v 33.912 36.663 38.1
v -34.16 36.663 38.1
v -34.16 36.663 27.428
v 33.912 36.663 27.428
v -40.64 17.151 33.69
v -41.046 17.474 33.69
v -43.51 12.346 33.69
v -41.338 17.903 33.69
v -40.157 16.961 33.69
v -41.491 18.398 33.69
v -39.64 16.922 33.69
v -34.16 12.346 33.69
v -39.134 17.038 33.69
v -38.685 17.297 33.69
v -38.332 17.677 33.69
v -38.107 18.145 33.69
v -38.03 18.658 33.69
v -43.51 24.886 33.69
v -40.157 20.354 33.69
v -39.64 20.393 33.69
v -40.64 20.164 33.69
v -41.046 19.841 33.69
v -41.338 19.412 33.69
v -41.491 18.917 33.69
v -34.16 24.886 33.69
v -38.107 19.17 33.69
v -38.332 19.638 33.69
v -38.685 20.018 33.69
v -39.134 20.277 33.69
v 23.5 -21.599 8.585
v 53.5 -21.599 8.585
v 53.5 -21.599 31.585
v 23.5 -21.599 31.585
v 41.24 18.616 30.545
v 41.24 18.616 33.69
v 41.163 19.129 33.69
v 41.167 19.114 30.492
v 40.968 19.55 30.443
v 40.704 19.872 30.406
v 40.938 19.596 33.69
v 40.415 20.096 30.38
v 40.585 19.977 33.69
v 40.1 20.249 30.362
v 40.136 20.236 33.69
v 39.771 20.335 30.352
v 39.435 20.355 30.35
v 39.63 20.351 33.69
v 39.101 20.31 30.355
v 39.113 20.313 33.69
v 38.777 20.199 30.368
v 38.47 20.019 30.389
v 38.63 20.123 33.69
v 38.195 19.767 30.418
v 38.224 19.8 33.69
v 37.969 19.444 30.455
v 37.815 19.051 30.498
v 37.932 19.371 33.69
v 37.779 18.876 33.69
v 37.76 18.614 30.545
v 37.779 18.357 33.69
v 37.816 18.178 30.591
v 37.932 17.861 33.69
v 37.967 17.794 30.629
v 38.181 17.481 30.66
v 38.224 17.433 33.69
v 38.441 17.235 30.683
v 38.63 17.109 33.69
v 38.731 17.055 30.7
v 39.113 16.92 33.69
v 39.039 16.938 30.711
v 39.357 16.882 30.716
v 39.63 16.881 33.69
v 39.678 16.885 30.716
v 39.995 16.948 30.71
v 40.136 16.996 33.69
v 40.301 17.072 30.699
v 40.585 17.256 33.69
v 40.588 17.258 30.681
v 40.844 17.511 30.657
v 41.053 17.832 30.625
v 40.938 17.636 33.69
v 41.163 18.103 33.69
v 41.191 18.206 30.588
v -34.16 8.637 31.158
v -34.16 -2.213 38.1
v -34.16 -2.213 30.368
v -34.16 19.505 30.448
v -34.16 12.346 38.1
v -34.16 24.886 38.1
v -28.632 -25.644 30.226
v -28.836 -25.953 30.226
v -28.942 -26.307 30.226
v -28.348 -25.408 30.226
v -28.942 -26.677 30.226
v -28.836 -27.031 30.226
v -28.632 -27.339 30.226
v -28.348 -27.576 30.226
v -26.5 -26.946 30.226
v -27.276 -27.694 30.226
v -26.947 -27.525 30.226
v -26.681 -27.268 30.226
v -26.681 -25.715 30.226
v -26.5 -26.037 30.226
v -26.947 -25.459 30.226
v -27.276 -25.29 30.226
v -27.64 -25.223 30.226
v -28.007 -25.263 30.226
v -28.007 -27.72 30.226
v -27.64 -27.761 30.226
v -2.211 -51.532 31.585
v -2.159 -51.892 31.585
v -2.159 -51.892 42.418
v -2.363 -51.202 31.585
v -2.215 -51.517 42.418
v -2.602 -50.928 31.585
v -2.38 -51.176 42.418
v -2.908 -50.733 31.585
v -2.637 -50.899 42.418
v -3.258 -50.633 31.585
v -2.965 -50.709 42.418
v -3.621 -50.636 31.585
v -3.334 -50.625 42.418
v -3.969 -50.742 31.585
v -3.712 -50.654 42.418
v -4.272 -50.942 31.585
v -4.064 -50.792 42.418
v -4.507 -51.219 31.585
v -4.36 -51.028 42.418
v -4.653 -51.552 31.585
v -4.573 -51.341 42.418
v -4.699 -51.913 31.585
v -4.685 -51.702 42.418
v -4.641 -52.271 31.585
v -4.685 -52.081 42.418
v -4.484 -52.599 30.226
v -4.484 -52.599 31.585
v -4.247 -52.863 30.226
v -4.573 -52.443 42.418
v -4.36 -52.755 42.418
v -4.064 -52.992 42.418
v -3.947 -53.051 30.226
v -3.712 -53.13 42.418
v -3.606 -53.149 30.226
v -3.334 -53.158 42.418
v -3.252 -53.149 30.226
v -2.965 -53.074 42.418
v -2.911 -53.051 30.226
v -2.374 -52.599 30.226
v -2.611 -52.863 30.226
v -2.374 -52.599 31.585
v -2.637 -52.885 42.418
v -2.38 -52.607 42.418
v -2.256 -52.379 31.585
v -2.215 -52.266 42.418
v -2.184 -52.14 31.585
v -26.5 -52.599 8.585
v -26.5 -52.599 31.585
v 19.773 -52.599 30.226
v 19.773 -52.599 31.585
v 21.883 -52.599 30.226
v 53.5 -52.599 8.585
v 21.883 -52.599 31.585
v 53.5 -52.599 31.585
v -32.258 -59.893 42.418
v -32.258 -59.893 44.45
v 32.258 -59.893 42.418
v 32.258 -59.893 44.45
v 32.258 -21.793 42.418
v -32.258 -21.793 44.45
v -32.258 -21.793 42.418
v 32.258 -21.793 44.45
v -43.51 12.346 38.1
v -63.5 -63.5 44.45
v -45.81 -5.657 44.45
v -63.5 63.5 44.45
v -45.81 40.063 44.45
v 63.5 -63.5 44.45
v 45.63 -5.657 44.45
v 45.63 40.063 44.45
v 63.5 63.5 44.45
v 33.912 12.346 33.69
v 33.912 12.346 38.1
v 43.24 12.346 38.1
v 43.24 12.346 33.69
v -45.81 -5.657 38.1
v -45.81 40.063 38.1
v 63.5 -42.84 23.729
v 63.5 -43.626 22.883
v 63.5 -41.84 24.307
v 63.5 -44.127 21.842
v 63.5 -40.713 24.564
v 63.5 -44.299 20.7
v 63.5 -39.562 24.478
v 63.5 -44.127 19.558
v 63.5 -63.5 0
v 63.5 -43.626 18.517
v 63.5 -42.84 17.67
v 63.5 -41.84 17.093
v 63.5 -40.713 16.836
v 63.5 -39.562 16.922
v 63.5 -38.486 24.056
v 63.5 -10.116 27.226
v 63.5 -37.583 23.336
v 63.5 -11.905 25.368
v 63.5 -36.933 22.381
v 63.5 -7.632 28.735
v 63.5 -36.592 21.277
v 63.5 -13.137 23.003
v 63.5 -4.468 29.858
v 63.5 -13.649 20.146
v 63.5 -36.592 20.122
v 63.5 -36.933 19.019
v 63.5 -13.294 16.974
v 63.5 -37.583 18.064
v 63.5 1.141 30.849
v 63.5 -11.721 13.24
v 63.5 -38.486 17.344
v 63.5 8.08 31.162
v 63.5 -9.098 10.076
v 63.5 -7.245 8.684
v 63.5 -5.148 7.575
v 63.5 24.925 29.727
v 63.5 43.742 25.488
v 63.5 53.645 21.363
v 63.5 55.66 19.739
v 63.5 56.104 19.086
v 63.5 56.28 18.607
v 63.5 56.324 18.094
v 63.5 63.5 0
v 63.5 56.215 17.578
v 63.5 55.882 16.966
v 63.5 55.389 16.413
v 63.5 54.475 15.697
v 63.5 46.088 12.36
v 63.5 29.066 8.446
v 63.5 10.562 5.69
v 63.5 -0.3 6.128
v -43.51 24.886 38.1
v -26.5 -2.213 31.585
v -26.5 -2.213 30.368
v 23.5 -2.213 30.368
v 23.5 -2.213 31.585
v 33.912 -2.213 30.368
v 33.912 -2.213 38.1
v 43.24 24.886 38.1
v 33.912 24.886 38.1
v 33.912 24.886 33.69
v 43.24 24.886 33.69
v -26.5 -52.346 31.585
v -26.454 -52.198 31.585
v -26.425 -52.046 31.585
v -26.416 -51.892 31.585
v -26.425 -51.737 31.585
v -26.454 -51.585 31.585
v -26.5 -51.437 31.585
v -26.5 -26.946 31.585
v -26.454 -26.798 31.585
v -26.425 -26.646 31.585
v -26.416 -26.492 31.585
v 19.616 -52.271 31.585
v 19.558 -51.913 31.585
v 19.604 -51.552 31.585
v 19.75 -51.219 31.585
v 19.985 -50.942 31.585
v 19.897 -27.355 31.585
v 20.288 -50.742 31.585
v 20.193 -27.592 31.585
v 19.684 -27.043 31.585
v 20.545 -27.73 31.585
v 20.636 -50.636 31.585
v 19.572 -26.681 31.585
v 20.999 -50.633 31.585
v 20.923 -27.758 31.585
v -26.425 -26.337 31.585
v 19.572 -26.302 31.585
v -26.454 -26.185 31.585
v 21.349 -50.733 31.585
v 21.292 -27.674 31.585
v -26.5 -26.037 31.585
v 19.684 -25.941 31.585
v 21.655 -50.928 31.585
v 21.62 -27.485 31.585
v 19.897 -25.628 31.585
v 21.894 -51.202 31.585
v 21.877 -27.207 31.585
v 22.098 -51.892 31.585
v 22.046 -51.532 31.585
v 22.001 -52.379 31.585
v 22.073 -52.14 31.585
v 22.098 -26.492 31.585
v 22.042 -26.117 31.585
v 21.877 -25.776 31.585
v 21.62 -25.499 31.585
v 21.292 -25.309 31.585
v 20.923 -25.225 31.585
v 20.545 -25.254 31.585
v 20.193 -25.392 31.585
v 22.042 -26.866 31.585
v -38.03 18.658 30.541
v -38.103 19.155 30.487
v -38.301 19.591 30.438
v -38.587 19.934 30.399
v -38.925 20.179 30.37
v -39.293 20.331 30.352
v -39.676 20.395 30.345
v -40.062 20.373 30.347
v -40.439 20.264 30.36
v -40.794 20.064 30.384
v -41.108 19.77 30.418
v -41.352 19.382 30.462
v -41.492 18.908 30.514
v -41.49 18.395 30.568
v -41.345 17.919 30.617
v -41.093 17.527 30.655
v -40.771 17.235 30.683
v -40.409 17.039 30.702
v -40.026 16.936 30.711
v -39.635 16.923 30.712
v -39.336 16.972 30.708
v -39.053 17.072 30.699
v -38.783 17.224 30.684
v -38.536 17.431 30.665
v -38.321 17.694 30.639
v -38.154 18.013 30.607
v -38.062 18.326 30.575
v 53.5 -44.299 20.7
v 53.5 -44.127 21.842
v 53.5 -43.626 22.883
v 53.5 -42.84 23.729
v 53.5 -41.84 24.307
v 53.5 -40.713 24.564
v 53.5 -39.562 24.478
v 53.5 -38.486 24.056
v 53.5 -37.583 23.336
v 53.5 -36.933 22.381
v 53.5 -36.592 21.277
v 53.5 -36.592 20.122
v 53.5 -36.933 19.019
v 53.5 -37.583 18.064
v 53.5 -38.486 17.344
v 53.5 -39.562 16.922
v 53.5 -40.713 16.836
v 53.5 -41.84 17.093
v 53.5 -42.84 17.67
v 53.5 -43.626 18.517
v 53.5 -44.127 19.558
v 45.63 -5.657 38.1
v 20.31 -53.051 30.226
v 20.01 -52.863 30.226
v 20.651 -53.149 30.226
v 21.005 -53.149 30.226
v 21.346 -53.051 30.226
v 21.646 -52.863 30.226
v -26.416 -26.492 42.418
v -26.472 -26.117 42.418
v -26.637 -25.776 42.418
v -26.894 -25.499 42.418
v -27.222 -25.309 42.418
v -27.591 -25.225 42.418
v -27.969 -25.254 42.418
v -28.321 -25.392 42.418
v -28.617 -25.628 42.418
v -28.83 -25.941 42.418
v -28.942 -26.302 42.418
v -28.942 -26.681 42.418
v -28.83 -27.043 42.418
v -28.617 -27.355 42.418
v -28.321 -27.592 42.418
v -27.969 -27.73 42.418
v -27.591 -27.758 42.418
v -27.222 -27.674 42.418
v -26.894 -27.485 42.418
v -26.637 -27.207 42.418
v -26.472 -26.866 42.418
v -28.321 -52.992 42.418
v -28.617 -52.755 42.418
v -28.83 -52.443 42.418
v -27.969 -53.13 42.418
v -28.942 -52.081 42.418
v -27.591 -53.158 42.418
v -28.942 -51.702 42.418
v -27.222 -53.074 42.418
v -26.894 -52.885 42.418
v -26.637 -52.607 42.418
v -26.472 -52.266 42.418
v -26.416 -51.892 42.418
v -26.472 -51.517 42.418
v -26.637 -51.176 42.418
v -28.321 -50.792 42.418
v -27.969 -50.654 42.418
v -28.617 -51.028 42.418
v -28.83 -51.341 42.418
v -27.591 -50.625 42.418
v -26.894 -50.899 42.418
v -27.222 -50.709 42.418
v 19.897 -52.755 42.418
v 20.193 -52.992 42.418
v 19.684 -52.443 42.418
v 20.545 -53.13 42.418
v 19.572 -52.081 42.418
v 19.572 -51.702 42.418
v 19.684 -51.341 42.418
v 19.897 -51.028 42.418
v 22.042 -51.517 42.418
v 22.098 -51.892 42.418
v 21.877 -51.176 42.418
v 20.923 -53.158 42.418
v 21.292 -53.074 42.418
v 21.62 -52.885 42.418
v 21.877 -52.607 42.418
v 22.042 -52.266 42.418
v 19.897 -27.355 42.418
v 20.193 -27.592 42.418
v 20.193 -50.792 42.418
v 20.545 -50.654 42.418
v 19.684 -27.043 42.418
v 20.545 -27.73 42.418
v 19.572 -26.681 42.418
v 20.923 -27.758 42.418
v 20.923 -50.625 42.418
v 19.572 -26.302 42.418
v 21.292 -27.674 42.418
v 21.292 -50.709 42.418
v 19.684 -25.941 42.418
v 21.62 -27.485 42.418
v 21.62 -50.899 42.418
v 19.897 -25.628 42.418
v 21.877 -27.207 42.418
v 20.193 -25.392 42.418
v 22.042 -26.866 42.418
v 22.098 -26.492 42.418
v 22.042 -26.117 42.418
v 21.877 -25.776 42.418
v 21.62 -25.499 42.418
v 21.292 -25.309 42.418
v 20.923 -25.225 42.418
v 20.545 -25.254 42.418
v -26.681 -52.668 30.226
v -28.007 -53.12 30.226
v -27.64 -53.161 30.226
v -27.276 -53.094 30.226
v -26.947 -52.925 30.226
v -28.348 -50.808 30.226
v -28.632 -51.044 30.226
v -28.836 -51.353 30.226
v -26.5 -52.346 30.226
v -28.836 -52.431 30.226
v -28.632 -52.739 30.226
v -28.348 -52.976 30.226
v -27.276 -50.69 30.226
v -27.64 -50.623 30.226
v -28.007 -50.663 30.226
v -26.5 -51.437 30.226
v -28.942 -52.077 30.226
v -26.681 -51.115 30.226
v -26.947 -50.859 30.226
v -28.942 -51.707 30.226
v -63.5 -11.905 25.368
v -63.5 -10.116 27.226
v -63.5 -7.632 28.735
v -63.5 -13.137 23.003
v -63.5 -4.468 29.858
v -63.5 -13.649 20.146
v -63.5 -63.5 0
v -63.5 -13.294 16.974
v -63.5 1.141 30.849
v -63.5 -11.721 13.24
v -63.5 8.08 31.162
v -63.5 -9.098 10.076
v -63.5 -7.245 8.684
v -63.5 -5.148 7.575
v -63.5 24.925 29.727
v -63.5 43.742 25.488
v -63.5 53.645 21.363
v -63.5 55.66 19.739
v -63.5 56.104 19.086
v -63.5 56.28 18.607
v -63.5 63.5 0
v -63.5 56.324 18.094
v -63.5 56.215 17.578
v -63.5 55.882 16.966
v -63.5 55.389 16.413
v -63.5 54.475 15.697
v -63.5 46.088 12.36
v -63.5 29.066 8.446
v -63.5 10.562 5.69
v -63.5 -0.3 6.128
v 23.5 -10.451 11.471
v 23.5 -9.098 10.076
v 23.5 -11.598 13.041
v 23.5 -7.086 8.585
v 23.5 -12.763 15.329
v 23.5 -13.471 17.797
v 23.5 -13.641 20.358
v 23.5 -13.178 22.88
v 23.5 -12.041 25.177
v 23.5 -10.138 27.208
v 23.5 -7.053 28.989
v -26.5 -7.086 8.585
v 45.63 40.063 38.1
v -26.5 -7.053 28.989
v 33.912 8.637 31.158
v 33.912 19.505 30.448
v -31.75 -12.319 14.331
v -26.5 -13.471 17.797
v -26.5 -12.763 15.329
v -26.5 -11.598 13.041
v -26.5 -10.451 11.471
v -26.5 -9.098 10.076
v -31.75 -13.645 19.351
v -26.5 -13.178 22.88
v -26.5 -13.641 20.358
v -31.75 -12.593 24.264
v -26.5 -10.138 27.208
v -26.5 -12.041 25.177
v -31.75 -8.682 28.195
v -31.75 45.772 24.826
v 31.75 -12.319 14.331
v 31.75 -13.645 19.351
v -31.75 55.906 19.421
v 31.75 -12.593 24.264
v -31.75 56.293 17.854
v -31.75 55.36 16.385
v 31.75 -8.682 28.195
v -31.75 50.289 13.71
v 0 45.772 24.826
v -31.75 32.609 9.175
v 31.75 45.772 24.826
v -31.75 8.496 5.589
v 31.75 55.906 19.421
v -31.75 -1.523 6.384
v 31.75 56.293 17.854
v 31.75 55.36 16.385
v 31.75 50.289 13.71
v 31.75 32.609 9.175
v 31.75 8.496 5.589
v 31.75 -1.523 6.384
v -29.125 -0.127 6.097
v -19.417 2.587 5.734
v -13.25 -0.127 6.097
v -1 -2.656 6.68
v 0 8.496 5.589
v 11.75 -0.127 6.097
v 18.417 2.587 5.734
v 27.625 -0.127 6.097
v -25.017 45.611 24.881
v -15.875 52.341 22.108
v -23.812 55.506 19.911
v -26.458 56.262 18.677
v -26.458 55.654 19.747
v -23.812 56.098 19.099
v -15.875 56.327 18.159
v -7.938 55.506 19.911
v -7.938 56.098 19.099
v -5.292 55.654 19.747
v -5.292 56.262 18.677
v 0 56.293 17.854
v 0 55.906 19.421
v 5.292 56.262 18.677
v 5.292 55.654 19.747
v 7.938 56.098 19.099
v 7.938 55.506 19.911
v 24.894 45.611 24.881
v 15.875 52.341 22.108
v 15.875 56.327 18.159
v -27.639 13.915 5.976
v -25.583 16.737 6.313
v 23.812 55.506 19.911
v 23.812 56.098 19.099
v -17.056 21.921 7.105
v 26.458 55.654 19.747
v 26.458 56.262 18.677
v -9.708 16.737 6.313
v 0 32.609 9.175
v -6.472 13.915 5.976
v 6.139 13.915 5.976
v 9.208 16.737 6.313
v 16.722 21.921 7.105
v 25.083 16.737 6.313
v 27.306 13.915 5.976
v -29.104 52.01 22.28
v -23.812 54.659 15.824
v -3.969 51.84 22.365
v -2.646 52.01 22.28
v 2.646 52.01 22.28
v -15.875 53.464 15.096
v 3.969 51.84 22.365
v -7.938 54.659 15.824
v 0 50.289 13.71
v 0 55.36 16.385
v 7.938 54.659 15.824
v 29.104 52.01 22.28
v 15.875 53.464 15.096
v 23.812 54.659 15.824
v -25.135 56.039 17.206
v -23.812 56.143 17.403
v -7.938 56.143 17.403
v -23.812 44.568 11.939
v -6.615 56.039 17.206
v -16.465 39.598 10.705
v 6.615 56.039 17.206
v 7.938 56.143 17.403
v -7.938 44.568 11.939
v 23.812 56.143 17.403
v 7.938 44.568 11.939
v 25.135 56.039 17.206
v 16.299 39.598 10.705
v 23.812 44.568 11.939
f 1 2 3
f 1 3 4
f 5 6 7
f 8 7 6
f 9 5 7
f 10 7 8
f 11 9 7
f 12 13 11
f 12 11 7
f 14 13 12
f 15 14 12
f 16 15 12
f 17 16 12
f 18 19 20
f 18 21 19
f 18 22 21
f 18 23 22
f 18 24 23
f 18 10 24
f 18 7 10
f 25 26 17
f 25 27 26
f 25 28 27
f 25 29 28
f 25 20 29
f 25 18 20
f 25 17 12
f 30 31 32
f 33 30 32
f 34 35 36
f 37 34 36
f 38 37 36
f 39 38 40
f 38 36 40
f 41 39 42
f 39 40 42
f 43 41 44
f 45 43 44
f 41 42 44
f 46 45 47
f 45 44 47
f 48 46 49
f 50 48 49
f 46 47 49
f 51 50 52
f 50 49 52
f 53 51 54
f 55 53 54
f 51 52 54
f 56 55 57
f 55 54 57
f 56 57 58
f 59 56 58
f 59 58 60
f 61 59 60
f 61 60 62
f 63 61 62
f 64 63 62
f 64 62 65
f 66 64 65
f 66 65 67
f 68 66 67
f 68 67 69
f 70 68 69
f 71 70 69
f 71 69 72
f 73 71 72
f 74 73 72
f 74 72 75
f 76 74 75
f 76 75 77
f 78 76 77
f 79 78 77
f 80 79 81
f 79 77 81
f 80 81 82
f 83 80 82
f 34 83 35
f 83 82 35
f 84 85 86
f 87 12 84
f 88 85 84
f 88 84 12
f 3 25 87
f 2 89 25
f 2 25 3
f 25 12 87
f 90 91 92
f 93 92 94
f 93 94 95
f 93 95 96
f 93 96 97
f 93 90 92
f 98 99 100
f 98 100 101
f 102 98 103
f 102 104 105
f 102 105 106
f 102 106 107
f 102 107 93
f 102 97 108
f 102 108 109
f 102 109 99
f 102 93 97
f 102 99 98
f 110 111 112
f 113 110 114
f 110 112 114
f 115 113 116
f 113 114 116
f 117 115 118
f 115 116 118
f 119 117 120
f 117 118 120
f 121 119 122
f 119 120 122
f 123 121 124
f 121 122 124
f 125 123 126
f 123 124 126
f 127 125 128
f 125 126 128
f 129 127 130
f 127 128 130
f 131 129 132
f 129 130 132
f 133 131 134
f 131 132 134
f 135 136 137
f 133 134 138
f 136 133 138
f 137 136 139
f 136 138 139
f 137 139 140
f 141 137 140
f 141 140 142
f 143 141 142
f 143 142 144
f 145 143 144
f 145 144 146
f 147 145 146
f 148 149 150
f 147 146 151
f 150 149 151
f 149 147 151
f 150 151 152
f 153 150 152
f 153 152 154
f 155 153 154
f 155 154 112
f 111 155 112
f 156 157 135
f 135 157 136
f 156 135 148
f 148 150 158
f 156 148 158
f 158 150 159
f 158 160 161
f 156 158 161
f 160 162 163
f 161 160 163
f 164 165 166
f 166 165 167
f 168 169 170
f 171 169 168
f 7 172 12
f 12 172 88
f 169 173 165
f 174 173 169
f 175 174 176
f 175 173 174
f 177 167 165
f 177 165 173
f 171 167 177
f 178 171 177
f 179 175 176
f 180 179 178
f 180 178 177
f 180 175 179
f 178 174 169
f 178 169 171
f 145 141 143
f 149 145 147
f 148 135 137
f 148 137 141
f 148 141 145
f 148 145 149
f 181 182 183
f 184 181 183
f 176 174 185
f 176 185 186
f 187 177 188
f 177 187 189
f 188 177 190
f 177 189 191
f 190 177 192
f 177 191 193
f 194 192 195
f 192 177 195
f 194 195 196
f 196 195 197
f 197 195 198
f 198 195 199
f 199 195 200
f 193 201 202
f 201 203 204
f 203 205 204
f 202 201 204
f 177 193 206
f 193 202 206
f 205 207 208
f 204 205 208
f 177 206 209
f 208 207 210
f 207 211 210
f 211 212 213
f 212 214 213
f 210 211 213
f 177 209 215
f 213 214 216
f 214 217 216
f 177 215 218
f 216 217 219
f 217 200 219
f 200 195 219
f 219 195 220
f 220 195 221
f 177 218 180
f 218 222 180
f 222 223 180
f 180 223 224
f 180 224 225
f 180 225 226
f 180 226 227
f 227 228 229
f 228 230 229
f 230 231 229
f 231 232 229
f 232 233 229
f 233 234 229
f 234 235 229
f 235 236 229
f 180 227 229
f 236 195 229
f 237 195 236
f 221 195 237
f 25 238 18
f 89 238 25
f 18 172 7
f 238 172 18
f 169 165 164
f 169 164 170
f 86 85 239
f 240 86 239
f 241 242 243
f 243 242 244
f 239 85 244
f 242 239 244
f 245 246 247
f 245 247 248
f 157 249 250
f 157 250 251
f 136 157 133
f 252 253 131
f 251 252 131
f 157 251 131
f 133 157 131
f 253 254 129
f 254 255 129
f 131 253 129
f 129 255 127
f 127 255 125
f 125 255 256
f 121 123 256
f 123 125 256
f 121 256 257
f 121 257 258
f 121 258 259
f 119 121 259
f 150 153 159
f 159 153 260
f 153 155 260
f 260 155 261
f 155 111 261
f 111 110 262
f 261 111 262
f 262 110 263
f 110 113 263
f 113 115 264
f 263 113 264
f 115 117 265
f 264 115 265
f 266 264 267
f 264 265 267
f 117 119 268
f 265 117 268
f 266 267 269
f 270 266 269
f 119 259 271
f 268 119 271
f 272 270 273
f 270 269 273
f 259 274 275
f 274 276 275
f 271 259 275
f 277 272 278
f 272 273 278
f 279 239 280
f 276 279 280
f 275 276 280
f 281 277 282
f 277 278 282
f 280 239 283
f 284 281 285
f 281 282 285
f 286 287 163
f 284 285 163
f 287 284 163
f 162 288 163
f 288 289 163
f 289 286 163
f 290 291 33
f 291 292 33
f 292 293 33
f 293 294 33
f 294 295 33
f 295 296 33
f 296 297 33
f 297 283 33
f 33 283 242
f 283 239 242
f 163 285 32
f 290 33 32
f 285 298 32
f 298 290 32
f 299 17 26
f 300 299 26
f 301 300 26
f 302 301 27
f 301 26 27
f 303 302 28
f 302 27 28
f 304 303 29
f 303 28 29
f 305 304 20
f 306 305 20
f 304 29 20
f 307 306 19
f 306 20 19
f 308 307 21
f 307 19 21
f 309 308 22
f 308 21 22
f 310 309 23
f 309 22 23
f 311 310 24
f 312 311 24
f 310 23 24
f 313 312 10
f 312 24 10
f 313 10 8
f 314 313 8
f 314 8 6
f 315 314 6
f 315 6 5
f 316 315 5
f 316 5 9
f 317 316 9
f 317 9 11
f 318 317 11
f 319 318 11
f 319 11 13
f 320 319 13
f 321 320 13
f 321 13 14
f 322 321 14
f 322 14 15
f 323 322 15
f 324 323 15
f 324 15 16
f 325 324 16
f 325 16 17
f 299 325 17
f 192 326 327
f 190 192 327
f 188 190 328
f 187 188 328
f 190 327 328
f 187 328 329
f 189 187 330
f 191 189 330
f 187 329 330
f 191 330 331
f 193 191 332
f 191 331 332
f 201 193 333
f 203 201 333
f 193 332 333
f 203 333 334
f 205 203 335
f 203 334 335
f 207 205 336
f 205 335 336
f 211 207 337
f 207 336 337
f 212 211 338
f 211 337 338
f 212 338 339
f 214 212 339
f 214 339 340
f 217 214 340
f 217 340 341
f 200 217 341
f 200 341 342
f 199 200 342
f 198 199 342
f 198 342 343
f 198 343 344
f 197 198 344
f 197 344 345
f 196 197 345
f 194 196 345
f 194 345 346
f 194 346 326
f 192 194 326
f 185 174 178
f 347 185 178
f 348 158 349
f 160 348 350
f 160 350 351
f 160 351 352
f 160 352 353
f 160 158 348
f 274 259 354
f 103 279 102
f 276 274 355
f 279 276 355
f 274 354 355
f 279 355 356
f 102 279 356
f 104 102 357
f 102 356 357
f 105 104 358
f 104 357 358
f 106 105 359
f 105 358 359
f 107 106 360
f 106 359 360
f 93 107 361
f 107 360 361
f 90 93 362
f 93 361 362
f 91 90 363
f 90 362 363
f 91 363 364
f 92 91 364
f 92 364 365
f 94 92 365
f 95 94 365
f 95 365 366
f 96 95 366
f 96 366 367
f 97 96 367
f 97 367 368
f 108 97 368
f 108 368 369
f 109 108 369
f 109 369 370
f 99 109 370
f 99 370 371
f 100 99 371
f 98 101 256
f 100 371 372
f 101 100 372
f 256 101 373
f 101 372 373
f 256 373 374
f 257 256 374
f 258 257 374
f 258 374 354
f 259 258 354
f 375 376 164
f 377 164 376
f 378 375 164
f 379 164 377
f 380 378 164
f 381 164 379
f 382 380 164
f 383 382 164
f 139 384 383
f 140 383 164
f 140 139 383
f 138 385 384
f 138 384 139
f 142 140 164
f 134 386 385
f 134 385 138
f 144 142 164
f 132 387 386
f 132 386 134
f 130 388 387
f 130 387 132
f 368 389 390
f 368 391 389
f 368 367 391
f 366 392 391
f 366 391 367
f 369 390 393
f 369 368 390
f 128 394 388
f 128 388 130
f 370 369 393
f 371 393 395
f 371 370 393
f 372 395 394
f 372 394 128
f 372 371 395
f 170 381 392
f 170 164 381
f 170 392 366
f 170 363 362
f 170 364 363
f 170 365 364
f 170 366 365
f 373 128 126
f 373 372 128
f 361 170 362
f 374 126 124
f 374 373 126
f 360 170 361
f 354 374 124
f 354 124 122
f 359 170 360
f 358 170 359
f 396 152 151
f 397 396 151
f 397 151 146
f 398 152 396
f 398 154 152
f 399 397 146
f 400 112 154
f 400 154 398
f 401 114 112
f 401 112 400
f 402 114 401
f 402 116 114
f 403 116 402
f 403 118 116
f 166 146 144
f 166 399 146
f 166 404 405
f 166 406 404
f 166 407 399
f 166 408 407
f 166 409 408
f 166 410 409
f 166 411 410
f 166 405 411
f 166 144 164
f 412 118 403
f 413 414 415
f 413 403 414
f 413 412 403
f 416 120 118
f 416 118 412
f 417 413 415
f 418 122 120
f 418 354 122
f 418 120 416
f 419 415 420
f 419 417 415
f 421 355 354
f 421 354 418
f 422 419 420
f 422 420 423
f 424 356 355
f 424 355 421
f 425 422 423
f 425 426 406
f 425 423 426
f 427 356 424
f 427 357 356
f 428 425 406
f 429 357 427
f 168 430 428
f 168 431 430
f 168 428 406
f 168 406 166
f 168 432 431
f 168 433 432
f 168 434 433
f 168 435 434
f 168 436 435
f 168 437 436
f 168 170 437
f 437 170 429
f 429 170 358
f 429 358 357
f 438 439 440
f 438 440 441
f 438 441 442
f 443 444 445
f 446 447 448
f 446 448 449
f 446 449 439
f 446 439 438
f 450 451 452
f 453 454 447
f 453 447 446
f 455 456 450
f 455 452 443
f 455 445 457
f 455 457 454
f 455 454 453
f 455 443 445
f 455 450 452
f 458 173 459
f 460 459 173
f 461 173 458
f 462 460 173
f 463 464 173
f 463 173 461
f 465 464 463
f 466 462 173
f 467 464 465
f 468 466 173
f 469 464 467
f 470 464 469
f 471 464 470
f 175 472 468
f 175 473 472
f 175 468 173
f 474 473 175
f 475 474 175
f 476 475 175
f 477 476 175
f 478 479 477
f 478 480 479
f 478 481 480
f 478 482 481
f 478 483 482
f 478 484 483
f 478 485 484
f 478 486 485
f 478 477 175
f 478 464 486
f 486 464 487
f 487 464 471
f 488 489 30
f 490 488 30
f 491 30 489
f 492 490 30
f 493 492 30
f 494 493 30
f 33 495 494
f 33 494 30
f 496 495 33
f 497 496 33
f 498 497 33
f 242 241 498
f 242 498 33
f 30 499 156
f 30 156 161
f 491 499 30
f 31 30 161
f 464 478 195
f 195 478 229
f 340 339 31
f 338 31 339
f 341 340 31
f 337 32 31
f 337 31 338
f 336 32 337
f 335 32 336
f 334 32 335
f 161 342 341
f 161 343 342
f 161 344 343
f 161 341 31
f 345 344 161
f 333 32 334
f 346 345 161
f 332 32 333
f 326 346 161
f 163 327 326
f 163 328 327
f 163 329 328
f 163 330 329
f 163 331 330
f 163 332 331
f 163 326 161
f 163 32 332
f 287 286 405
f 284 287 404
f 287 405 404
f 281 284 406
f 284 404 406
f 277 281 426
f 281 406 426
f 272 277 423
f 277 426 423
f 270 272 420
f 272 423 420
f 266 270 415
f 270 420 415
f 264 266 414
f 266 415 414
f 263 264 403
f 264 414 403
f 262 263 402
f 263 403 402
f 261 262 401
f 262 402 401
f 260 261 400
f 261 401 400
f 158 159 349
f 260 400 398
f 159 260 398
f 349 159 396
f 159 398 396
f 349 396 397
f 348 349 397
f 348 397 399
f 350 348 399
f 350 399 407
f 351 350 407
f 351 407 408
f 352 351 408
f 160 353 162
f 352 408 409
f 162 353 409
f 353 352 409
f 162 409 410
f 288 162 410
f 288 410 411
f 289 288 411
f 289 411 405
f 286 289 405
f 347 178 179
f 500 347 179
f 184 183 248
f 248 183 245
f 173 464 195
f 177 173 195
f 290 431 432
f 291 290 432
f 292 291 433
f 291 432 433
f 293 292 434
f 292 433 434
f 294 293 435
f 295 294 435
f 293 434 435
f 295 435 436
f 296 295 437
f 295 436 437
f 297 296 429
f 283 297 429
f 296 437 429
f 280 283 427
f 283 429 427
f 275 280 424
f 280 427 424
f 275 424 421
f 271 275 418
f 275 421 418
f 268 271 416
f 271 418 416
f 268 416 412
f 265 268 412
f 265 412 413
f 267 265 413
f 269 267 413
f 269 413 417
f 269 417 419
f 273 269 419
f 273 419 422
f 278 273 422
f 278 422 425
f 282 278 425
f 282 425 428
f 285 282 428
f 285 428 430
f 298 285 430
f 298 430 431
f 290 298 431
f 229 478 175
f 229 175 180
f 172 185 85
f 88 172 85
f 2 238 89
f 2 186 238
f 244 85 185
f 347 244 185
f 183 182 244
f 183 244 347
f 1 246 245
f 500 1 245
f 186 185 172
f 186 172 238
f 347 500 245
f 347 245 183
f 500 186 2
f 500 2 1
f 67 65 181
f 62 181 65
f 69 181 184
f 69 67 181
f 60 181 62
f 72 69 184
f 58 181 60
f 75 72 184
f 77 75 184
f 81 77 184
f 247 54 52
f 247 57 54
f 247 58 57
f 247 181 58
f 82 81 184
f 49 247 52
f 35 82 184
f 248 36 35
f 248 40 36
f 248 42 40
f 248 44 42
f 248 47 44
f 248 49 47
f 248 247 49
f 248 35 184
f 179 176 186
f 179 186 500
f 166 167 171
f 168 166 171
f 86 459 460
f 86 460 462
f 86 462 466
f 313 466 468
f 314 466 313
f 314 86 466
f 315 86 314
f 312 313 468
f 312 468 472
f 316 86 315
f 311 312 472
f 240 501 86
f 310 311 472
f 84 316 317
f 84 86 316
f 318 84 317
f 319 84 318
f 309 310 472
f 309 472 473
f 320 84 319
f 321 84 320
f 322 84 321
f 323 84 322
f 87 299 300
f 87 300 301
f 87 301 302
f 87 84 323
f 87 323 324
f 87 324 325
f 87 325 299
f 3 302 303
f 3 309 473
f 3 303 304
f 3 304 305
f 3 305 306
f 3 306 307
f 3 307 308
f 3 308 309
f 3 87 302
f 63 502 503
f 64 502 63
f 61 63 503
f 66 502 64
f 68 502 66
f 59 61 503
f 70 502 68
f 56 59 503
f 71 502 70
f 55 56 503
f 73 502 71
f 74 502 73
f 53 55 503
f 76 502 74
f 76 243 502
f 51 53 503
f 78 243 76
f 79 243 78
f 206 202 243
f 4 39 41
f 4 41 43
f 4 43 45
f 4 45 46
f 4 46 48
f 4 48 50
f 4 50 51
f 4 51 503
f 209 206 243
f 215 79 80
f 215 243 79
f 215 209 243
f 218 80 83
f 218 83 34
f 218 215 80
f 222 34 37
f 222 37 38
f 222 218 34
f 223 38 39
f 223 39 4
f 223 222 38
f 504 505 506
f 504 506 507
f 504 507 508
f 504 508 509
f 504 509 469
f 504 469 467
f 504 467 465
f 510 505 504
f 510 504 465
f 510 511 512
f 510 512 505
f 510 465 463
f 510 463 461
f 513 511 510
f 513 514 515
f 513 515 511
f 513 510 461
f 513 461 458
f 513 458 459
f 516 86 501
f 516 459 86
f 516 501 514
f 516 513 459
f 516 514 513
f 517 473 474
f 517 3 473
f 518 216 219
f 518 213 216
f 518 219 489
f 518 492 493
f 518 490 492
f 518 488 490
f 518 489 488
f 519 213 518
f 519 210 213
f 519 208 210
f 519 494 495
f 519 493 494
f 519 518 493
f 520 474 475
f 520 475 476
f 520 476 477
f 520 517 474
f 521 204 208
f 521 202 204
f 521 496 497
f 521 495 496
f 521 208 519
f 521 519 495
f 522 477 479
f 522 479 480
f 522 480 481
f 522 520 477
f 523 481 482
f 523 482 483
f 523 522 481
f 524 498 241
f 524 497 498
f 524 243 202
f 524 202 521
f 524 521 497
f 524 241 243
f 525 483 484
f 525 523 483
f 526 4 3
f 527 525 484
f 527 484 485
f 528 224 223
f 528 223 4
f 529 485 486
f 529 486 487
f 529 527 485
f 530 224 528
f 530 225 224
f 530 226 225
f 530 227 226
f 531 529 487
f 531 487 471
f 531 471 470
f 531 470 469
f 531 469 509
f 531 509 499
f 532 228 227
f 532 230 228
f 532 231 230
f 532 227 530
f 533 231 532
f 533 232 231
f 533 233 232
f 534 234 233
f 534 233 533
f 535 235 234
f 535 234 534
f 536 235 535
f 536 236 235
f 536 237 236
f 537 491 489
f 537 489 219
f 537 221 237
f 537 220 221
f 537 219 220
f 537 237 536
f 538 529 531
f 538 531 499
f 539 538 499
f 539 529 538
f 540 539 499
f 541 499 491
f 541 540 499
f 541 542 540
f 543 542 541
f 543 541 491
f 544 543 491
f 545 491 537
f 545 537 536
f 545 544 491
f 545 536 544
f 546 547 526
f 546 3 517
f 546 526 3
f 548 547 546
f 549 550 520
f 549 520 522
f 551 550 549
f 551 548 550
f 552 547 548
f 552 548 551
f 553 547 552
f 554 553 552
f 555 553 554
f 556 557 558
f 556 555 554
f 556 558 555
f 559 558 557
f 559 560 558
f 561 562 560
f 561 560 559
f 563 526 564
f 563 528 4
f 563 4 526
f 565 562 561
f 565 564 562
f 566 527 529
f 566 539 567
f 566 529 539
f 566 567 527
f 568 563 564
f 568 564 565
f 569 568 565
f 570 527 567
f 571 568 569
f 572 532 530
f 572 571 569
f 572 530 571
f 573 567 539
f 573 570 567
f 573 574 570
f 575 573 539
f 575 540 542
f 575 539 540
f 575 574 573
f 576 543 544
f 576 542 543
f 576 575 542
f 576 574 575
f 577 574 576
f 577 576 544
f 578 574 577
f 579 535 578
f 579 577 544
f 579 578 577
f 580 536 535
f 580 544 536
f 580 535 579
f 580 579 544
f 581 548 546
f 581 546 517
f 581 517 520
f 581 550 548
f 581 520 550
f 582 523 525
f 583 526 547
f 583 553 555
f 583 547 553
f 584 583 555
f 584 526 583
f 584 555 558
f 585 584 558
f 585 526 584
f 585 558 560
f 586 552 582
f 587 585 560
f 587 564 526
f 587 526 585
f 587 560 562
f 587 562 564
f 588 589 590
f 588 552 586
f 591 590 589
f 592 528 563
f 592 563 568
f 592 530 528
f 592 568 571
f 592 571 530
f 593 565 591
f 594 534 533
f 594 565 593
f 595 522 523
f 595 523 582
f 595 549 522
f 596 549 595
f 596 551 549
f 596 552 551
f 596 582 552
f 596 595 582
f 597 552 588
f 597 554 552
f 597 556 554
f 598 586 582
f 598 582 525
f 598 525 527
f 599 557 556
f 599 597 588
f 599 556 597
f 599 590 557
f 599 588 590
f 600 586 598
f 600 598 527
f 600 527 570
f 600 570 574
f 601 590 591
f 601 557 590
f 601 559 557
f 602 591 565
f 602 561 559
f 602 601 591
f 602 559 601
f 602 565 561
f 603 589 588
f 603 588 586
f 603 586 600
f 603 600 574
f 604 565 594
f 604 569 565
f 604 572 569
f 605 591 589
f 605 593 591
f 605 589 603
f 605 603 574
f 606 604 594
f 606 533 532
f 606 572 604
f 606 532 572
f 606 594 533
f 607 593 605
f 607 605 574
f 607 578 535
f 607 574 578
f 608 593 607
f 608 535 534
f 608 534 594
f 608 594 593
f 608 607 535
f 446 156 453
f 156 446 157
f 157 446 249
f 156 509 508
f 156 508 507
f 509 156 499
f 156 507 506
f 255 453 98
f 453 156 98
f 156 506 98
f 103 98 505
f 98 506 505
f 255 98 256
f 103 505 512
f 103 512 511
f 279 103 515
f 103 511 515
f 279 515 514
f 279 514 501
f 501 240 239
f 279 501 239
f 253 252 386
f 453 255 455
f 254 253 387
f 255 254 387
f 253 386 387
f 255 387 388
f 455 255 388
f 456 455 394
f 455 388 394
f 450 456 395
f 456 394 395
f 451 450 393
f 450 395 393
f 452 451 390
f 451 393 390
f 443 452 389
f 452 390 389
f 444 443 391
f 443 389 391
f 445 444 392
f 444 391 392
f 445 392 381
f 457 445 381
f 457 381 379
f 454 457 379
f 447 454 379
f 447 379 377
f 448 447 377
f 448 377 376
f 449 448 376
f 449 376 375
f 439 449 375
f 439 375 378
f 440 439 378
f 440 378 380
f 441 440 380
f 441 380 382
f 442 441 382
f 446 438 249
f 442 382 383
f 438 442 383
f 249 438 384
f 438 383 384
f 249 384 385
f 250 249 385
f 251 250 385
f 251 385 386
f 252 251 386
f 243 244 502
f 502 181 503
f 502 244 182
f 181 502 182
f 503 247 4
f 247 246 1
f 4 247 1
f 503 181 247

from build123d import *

# Parameters (mm, degrees)
F0_W      = 127
F0_H      = 127
F1_DEPTH  = 44.45
F2_W      = 64.516
F2_H      = 38.1
F3_DEPTH  = 2.032
F4_R      = 1.27
F5_DEPTH  = 12.192
F6_R      = 1.27
F7_DEPTH  = 12.192
F9_DEPTH  = 127
F10_W     = 91.44
F10_H     = 45.72
F11_DEPTH = 6.35
F12_W     = 68.072
F12_H     = 38.876
F13_DEPTH = 13.87
F14_W     = 9.35
F14_H     = 12.54
F15_DEPTH = 4.41
F16_R     = 1.74
F17_DEPTH = 8.4
F18_W     = 50
F18_H     = 23
F19_DEPTH = 52.59892
F20_W     = 31
F20_H     = 23
F21_DEPTH = 30
F22_R     = 3.875
F23_DEPTH = 10.4


with BuildPart() as f1:
    # F0 (on Top) → F1 (new body)
    with BuildSketch(Plane.XY):
        Rectangle(F0_W, F0_H)
    extrude(amount=F1_DEPTH)

    # F2 (on face) → F3 (cut)
    with BuildSketch(Plane.XY.offset(44.45)):
        with Locations((0, -40.8426690847)):
            Rectangle(F2_W, F2_H)
    extrude(amount=-F3_DEPTH, mode=Mode.SUBTRACT)

    # F4 (on face) → F5 (cut)
    with BuildSketch(Plane.XY.offset(42.418)):
        with Locations((20.828, -26.4916690847)):
            Circle(F4_R)
        with Locations((20.828, -51.8916690847)):
            Circle(F4_R)
        with Locations((-3.429, -51.8916690847)):
            Circle(F4_R)
        with Locations((-3.429, -26.4916690847)):
            Circle(F4_R)
        with Locations((-27.686, -26.4916690847)):
            Circle(F4_R)
        with Locations((-27.686, -51.8916690847)):
            Circle(F4_R)
    extrude(amount=-F5_DEPTH, mode=Mode.SUBTRACT)

    # F6 (on face) → F7 (join, through all)
    with BuildSketch(Plane.XY.offset(30.226)):
        with Locations((-3.429, -26.4916690847)):
            Circle(F6_R)
    extrude(amount=F7_DEPTH)

    # F8 (on face) → F9 (cut, through all)
    with BuildSketch(Plane.YZ.offset(63.5)):
        with BuildLine():
            add(Edge.make_bspline(
                [(-9.0976032104, 10.0759316516), (-14.4431789893, 14.8498555161), (-18.9998192848, 41.3407976718), (79.8789980532, 20.1886498245), (28.9220234676, 7.8572214413), (-0.9875973505, 2.8332038113), (-9.0976032104, 10.0759316516)],
                knots=[0, 0, 0, 0, 0.1786168384, 0.5173503637, 0.7290126141, 1, 1, 1, 1], degree=3))
        make_face()
    extrude(amount=-F9_DEPTH, mode=Mode.SUBTRACT)

    # F10 (on face) → F11 (cut)
    with BuildSketch(Plane.XY.offset(44.45)):
        with Locations((-0.09, 17.2031538572)):
            Rectangle(F10_W, F10_H)
    extrude(amount=-F11_DEPTH, mode=Mode.SUBTRACT)

    # F12 (on face) → F13 (cut)
    with BuildSketch(Plane.XY.offset(38.1)):
        with Locations((-0.124, 17.2251538572)):
            Rectangle(F12_W, F12_H)
    extrude(amount=-F13_DEPTH, mode=Mode.SUBTRACT)

    # F14 (on face) → F15 (cut)
    with BuildSketch(Plane.XY.offset(38.1)):
        with Locations((-38.835, 18.6161745679)):
            Rectangle(F14_W, F14_H)
        with Locations((38.565, 18.6161745679)):
            Rectangle(F14_W, F14_H)
    extrude(amount=-F15_DEPTH, mode=Mode.SUBTRACT)

    # F16 (on face) → F17 (cut)
    with BuildSketch(Plane.XY.offset(33.69)):
        with Locations((39.5, 18.6161745679)):
            Circle(F16_R)
        with Locations((-39.77, 18.657527864)):
            Circle(F16_R)
    extrude(amount=-F17_DEPTH, mode=Mode.SUBTRACT)

    # F18 (on Front) → F19 (cut)
    with BuildSketch(Plane.XZ):
        with Locations((-1.5, 20.0853766873)):
            Rectangle(F18_W, F18_H)
    extrude(amount=F19_DEPTH, mode=Mode.SUBTRACT)

    # F20 (on face) → F21 (cut)
    with BuildSketch(Plane(origin=(23.5, 0, 0), x_dir=(0, -1, 0), z_dir=(-1, 0, 0))):
        with Locations((37.09892, 20.0853766873)):
            Rectangle(F20_W, F20_H)
    extrude(amount=-F21_DEPTH, mode=Mode.SUBTRACT)

    # F22 (on face) → F23 (cut)
    with BuildSketch(Plane(origin=(53.5, 0, 0), x_dir=(0, -1, 0), z_dir=(-1, 0, 0))):
        with Locations((40.42392, 20.6998754293)):
            Circle(F22_R)
    extrude(amount=-F23_DEPTH, mode=Mode.SUBTRACT)


solid = f1.part
